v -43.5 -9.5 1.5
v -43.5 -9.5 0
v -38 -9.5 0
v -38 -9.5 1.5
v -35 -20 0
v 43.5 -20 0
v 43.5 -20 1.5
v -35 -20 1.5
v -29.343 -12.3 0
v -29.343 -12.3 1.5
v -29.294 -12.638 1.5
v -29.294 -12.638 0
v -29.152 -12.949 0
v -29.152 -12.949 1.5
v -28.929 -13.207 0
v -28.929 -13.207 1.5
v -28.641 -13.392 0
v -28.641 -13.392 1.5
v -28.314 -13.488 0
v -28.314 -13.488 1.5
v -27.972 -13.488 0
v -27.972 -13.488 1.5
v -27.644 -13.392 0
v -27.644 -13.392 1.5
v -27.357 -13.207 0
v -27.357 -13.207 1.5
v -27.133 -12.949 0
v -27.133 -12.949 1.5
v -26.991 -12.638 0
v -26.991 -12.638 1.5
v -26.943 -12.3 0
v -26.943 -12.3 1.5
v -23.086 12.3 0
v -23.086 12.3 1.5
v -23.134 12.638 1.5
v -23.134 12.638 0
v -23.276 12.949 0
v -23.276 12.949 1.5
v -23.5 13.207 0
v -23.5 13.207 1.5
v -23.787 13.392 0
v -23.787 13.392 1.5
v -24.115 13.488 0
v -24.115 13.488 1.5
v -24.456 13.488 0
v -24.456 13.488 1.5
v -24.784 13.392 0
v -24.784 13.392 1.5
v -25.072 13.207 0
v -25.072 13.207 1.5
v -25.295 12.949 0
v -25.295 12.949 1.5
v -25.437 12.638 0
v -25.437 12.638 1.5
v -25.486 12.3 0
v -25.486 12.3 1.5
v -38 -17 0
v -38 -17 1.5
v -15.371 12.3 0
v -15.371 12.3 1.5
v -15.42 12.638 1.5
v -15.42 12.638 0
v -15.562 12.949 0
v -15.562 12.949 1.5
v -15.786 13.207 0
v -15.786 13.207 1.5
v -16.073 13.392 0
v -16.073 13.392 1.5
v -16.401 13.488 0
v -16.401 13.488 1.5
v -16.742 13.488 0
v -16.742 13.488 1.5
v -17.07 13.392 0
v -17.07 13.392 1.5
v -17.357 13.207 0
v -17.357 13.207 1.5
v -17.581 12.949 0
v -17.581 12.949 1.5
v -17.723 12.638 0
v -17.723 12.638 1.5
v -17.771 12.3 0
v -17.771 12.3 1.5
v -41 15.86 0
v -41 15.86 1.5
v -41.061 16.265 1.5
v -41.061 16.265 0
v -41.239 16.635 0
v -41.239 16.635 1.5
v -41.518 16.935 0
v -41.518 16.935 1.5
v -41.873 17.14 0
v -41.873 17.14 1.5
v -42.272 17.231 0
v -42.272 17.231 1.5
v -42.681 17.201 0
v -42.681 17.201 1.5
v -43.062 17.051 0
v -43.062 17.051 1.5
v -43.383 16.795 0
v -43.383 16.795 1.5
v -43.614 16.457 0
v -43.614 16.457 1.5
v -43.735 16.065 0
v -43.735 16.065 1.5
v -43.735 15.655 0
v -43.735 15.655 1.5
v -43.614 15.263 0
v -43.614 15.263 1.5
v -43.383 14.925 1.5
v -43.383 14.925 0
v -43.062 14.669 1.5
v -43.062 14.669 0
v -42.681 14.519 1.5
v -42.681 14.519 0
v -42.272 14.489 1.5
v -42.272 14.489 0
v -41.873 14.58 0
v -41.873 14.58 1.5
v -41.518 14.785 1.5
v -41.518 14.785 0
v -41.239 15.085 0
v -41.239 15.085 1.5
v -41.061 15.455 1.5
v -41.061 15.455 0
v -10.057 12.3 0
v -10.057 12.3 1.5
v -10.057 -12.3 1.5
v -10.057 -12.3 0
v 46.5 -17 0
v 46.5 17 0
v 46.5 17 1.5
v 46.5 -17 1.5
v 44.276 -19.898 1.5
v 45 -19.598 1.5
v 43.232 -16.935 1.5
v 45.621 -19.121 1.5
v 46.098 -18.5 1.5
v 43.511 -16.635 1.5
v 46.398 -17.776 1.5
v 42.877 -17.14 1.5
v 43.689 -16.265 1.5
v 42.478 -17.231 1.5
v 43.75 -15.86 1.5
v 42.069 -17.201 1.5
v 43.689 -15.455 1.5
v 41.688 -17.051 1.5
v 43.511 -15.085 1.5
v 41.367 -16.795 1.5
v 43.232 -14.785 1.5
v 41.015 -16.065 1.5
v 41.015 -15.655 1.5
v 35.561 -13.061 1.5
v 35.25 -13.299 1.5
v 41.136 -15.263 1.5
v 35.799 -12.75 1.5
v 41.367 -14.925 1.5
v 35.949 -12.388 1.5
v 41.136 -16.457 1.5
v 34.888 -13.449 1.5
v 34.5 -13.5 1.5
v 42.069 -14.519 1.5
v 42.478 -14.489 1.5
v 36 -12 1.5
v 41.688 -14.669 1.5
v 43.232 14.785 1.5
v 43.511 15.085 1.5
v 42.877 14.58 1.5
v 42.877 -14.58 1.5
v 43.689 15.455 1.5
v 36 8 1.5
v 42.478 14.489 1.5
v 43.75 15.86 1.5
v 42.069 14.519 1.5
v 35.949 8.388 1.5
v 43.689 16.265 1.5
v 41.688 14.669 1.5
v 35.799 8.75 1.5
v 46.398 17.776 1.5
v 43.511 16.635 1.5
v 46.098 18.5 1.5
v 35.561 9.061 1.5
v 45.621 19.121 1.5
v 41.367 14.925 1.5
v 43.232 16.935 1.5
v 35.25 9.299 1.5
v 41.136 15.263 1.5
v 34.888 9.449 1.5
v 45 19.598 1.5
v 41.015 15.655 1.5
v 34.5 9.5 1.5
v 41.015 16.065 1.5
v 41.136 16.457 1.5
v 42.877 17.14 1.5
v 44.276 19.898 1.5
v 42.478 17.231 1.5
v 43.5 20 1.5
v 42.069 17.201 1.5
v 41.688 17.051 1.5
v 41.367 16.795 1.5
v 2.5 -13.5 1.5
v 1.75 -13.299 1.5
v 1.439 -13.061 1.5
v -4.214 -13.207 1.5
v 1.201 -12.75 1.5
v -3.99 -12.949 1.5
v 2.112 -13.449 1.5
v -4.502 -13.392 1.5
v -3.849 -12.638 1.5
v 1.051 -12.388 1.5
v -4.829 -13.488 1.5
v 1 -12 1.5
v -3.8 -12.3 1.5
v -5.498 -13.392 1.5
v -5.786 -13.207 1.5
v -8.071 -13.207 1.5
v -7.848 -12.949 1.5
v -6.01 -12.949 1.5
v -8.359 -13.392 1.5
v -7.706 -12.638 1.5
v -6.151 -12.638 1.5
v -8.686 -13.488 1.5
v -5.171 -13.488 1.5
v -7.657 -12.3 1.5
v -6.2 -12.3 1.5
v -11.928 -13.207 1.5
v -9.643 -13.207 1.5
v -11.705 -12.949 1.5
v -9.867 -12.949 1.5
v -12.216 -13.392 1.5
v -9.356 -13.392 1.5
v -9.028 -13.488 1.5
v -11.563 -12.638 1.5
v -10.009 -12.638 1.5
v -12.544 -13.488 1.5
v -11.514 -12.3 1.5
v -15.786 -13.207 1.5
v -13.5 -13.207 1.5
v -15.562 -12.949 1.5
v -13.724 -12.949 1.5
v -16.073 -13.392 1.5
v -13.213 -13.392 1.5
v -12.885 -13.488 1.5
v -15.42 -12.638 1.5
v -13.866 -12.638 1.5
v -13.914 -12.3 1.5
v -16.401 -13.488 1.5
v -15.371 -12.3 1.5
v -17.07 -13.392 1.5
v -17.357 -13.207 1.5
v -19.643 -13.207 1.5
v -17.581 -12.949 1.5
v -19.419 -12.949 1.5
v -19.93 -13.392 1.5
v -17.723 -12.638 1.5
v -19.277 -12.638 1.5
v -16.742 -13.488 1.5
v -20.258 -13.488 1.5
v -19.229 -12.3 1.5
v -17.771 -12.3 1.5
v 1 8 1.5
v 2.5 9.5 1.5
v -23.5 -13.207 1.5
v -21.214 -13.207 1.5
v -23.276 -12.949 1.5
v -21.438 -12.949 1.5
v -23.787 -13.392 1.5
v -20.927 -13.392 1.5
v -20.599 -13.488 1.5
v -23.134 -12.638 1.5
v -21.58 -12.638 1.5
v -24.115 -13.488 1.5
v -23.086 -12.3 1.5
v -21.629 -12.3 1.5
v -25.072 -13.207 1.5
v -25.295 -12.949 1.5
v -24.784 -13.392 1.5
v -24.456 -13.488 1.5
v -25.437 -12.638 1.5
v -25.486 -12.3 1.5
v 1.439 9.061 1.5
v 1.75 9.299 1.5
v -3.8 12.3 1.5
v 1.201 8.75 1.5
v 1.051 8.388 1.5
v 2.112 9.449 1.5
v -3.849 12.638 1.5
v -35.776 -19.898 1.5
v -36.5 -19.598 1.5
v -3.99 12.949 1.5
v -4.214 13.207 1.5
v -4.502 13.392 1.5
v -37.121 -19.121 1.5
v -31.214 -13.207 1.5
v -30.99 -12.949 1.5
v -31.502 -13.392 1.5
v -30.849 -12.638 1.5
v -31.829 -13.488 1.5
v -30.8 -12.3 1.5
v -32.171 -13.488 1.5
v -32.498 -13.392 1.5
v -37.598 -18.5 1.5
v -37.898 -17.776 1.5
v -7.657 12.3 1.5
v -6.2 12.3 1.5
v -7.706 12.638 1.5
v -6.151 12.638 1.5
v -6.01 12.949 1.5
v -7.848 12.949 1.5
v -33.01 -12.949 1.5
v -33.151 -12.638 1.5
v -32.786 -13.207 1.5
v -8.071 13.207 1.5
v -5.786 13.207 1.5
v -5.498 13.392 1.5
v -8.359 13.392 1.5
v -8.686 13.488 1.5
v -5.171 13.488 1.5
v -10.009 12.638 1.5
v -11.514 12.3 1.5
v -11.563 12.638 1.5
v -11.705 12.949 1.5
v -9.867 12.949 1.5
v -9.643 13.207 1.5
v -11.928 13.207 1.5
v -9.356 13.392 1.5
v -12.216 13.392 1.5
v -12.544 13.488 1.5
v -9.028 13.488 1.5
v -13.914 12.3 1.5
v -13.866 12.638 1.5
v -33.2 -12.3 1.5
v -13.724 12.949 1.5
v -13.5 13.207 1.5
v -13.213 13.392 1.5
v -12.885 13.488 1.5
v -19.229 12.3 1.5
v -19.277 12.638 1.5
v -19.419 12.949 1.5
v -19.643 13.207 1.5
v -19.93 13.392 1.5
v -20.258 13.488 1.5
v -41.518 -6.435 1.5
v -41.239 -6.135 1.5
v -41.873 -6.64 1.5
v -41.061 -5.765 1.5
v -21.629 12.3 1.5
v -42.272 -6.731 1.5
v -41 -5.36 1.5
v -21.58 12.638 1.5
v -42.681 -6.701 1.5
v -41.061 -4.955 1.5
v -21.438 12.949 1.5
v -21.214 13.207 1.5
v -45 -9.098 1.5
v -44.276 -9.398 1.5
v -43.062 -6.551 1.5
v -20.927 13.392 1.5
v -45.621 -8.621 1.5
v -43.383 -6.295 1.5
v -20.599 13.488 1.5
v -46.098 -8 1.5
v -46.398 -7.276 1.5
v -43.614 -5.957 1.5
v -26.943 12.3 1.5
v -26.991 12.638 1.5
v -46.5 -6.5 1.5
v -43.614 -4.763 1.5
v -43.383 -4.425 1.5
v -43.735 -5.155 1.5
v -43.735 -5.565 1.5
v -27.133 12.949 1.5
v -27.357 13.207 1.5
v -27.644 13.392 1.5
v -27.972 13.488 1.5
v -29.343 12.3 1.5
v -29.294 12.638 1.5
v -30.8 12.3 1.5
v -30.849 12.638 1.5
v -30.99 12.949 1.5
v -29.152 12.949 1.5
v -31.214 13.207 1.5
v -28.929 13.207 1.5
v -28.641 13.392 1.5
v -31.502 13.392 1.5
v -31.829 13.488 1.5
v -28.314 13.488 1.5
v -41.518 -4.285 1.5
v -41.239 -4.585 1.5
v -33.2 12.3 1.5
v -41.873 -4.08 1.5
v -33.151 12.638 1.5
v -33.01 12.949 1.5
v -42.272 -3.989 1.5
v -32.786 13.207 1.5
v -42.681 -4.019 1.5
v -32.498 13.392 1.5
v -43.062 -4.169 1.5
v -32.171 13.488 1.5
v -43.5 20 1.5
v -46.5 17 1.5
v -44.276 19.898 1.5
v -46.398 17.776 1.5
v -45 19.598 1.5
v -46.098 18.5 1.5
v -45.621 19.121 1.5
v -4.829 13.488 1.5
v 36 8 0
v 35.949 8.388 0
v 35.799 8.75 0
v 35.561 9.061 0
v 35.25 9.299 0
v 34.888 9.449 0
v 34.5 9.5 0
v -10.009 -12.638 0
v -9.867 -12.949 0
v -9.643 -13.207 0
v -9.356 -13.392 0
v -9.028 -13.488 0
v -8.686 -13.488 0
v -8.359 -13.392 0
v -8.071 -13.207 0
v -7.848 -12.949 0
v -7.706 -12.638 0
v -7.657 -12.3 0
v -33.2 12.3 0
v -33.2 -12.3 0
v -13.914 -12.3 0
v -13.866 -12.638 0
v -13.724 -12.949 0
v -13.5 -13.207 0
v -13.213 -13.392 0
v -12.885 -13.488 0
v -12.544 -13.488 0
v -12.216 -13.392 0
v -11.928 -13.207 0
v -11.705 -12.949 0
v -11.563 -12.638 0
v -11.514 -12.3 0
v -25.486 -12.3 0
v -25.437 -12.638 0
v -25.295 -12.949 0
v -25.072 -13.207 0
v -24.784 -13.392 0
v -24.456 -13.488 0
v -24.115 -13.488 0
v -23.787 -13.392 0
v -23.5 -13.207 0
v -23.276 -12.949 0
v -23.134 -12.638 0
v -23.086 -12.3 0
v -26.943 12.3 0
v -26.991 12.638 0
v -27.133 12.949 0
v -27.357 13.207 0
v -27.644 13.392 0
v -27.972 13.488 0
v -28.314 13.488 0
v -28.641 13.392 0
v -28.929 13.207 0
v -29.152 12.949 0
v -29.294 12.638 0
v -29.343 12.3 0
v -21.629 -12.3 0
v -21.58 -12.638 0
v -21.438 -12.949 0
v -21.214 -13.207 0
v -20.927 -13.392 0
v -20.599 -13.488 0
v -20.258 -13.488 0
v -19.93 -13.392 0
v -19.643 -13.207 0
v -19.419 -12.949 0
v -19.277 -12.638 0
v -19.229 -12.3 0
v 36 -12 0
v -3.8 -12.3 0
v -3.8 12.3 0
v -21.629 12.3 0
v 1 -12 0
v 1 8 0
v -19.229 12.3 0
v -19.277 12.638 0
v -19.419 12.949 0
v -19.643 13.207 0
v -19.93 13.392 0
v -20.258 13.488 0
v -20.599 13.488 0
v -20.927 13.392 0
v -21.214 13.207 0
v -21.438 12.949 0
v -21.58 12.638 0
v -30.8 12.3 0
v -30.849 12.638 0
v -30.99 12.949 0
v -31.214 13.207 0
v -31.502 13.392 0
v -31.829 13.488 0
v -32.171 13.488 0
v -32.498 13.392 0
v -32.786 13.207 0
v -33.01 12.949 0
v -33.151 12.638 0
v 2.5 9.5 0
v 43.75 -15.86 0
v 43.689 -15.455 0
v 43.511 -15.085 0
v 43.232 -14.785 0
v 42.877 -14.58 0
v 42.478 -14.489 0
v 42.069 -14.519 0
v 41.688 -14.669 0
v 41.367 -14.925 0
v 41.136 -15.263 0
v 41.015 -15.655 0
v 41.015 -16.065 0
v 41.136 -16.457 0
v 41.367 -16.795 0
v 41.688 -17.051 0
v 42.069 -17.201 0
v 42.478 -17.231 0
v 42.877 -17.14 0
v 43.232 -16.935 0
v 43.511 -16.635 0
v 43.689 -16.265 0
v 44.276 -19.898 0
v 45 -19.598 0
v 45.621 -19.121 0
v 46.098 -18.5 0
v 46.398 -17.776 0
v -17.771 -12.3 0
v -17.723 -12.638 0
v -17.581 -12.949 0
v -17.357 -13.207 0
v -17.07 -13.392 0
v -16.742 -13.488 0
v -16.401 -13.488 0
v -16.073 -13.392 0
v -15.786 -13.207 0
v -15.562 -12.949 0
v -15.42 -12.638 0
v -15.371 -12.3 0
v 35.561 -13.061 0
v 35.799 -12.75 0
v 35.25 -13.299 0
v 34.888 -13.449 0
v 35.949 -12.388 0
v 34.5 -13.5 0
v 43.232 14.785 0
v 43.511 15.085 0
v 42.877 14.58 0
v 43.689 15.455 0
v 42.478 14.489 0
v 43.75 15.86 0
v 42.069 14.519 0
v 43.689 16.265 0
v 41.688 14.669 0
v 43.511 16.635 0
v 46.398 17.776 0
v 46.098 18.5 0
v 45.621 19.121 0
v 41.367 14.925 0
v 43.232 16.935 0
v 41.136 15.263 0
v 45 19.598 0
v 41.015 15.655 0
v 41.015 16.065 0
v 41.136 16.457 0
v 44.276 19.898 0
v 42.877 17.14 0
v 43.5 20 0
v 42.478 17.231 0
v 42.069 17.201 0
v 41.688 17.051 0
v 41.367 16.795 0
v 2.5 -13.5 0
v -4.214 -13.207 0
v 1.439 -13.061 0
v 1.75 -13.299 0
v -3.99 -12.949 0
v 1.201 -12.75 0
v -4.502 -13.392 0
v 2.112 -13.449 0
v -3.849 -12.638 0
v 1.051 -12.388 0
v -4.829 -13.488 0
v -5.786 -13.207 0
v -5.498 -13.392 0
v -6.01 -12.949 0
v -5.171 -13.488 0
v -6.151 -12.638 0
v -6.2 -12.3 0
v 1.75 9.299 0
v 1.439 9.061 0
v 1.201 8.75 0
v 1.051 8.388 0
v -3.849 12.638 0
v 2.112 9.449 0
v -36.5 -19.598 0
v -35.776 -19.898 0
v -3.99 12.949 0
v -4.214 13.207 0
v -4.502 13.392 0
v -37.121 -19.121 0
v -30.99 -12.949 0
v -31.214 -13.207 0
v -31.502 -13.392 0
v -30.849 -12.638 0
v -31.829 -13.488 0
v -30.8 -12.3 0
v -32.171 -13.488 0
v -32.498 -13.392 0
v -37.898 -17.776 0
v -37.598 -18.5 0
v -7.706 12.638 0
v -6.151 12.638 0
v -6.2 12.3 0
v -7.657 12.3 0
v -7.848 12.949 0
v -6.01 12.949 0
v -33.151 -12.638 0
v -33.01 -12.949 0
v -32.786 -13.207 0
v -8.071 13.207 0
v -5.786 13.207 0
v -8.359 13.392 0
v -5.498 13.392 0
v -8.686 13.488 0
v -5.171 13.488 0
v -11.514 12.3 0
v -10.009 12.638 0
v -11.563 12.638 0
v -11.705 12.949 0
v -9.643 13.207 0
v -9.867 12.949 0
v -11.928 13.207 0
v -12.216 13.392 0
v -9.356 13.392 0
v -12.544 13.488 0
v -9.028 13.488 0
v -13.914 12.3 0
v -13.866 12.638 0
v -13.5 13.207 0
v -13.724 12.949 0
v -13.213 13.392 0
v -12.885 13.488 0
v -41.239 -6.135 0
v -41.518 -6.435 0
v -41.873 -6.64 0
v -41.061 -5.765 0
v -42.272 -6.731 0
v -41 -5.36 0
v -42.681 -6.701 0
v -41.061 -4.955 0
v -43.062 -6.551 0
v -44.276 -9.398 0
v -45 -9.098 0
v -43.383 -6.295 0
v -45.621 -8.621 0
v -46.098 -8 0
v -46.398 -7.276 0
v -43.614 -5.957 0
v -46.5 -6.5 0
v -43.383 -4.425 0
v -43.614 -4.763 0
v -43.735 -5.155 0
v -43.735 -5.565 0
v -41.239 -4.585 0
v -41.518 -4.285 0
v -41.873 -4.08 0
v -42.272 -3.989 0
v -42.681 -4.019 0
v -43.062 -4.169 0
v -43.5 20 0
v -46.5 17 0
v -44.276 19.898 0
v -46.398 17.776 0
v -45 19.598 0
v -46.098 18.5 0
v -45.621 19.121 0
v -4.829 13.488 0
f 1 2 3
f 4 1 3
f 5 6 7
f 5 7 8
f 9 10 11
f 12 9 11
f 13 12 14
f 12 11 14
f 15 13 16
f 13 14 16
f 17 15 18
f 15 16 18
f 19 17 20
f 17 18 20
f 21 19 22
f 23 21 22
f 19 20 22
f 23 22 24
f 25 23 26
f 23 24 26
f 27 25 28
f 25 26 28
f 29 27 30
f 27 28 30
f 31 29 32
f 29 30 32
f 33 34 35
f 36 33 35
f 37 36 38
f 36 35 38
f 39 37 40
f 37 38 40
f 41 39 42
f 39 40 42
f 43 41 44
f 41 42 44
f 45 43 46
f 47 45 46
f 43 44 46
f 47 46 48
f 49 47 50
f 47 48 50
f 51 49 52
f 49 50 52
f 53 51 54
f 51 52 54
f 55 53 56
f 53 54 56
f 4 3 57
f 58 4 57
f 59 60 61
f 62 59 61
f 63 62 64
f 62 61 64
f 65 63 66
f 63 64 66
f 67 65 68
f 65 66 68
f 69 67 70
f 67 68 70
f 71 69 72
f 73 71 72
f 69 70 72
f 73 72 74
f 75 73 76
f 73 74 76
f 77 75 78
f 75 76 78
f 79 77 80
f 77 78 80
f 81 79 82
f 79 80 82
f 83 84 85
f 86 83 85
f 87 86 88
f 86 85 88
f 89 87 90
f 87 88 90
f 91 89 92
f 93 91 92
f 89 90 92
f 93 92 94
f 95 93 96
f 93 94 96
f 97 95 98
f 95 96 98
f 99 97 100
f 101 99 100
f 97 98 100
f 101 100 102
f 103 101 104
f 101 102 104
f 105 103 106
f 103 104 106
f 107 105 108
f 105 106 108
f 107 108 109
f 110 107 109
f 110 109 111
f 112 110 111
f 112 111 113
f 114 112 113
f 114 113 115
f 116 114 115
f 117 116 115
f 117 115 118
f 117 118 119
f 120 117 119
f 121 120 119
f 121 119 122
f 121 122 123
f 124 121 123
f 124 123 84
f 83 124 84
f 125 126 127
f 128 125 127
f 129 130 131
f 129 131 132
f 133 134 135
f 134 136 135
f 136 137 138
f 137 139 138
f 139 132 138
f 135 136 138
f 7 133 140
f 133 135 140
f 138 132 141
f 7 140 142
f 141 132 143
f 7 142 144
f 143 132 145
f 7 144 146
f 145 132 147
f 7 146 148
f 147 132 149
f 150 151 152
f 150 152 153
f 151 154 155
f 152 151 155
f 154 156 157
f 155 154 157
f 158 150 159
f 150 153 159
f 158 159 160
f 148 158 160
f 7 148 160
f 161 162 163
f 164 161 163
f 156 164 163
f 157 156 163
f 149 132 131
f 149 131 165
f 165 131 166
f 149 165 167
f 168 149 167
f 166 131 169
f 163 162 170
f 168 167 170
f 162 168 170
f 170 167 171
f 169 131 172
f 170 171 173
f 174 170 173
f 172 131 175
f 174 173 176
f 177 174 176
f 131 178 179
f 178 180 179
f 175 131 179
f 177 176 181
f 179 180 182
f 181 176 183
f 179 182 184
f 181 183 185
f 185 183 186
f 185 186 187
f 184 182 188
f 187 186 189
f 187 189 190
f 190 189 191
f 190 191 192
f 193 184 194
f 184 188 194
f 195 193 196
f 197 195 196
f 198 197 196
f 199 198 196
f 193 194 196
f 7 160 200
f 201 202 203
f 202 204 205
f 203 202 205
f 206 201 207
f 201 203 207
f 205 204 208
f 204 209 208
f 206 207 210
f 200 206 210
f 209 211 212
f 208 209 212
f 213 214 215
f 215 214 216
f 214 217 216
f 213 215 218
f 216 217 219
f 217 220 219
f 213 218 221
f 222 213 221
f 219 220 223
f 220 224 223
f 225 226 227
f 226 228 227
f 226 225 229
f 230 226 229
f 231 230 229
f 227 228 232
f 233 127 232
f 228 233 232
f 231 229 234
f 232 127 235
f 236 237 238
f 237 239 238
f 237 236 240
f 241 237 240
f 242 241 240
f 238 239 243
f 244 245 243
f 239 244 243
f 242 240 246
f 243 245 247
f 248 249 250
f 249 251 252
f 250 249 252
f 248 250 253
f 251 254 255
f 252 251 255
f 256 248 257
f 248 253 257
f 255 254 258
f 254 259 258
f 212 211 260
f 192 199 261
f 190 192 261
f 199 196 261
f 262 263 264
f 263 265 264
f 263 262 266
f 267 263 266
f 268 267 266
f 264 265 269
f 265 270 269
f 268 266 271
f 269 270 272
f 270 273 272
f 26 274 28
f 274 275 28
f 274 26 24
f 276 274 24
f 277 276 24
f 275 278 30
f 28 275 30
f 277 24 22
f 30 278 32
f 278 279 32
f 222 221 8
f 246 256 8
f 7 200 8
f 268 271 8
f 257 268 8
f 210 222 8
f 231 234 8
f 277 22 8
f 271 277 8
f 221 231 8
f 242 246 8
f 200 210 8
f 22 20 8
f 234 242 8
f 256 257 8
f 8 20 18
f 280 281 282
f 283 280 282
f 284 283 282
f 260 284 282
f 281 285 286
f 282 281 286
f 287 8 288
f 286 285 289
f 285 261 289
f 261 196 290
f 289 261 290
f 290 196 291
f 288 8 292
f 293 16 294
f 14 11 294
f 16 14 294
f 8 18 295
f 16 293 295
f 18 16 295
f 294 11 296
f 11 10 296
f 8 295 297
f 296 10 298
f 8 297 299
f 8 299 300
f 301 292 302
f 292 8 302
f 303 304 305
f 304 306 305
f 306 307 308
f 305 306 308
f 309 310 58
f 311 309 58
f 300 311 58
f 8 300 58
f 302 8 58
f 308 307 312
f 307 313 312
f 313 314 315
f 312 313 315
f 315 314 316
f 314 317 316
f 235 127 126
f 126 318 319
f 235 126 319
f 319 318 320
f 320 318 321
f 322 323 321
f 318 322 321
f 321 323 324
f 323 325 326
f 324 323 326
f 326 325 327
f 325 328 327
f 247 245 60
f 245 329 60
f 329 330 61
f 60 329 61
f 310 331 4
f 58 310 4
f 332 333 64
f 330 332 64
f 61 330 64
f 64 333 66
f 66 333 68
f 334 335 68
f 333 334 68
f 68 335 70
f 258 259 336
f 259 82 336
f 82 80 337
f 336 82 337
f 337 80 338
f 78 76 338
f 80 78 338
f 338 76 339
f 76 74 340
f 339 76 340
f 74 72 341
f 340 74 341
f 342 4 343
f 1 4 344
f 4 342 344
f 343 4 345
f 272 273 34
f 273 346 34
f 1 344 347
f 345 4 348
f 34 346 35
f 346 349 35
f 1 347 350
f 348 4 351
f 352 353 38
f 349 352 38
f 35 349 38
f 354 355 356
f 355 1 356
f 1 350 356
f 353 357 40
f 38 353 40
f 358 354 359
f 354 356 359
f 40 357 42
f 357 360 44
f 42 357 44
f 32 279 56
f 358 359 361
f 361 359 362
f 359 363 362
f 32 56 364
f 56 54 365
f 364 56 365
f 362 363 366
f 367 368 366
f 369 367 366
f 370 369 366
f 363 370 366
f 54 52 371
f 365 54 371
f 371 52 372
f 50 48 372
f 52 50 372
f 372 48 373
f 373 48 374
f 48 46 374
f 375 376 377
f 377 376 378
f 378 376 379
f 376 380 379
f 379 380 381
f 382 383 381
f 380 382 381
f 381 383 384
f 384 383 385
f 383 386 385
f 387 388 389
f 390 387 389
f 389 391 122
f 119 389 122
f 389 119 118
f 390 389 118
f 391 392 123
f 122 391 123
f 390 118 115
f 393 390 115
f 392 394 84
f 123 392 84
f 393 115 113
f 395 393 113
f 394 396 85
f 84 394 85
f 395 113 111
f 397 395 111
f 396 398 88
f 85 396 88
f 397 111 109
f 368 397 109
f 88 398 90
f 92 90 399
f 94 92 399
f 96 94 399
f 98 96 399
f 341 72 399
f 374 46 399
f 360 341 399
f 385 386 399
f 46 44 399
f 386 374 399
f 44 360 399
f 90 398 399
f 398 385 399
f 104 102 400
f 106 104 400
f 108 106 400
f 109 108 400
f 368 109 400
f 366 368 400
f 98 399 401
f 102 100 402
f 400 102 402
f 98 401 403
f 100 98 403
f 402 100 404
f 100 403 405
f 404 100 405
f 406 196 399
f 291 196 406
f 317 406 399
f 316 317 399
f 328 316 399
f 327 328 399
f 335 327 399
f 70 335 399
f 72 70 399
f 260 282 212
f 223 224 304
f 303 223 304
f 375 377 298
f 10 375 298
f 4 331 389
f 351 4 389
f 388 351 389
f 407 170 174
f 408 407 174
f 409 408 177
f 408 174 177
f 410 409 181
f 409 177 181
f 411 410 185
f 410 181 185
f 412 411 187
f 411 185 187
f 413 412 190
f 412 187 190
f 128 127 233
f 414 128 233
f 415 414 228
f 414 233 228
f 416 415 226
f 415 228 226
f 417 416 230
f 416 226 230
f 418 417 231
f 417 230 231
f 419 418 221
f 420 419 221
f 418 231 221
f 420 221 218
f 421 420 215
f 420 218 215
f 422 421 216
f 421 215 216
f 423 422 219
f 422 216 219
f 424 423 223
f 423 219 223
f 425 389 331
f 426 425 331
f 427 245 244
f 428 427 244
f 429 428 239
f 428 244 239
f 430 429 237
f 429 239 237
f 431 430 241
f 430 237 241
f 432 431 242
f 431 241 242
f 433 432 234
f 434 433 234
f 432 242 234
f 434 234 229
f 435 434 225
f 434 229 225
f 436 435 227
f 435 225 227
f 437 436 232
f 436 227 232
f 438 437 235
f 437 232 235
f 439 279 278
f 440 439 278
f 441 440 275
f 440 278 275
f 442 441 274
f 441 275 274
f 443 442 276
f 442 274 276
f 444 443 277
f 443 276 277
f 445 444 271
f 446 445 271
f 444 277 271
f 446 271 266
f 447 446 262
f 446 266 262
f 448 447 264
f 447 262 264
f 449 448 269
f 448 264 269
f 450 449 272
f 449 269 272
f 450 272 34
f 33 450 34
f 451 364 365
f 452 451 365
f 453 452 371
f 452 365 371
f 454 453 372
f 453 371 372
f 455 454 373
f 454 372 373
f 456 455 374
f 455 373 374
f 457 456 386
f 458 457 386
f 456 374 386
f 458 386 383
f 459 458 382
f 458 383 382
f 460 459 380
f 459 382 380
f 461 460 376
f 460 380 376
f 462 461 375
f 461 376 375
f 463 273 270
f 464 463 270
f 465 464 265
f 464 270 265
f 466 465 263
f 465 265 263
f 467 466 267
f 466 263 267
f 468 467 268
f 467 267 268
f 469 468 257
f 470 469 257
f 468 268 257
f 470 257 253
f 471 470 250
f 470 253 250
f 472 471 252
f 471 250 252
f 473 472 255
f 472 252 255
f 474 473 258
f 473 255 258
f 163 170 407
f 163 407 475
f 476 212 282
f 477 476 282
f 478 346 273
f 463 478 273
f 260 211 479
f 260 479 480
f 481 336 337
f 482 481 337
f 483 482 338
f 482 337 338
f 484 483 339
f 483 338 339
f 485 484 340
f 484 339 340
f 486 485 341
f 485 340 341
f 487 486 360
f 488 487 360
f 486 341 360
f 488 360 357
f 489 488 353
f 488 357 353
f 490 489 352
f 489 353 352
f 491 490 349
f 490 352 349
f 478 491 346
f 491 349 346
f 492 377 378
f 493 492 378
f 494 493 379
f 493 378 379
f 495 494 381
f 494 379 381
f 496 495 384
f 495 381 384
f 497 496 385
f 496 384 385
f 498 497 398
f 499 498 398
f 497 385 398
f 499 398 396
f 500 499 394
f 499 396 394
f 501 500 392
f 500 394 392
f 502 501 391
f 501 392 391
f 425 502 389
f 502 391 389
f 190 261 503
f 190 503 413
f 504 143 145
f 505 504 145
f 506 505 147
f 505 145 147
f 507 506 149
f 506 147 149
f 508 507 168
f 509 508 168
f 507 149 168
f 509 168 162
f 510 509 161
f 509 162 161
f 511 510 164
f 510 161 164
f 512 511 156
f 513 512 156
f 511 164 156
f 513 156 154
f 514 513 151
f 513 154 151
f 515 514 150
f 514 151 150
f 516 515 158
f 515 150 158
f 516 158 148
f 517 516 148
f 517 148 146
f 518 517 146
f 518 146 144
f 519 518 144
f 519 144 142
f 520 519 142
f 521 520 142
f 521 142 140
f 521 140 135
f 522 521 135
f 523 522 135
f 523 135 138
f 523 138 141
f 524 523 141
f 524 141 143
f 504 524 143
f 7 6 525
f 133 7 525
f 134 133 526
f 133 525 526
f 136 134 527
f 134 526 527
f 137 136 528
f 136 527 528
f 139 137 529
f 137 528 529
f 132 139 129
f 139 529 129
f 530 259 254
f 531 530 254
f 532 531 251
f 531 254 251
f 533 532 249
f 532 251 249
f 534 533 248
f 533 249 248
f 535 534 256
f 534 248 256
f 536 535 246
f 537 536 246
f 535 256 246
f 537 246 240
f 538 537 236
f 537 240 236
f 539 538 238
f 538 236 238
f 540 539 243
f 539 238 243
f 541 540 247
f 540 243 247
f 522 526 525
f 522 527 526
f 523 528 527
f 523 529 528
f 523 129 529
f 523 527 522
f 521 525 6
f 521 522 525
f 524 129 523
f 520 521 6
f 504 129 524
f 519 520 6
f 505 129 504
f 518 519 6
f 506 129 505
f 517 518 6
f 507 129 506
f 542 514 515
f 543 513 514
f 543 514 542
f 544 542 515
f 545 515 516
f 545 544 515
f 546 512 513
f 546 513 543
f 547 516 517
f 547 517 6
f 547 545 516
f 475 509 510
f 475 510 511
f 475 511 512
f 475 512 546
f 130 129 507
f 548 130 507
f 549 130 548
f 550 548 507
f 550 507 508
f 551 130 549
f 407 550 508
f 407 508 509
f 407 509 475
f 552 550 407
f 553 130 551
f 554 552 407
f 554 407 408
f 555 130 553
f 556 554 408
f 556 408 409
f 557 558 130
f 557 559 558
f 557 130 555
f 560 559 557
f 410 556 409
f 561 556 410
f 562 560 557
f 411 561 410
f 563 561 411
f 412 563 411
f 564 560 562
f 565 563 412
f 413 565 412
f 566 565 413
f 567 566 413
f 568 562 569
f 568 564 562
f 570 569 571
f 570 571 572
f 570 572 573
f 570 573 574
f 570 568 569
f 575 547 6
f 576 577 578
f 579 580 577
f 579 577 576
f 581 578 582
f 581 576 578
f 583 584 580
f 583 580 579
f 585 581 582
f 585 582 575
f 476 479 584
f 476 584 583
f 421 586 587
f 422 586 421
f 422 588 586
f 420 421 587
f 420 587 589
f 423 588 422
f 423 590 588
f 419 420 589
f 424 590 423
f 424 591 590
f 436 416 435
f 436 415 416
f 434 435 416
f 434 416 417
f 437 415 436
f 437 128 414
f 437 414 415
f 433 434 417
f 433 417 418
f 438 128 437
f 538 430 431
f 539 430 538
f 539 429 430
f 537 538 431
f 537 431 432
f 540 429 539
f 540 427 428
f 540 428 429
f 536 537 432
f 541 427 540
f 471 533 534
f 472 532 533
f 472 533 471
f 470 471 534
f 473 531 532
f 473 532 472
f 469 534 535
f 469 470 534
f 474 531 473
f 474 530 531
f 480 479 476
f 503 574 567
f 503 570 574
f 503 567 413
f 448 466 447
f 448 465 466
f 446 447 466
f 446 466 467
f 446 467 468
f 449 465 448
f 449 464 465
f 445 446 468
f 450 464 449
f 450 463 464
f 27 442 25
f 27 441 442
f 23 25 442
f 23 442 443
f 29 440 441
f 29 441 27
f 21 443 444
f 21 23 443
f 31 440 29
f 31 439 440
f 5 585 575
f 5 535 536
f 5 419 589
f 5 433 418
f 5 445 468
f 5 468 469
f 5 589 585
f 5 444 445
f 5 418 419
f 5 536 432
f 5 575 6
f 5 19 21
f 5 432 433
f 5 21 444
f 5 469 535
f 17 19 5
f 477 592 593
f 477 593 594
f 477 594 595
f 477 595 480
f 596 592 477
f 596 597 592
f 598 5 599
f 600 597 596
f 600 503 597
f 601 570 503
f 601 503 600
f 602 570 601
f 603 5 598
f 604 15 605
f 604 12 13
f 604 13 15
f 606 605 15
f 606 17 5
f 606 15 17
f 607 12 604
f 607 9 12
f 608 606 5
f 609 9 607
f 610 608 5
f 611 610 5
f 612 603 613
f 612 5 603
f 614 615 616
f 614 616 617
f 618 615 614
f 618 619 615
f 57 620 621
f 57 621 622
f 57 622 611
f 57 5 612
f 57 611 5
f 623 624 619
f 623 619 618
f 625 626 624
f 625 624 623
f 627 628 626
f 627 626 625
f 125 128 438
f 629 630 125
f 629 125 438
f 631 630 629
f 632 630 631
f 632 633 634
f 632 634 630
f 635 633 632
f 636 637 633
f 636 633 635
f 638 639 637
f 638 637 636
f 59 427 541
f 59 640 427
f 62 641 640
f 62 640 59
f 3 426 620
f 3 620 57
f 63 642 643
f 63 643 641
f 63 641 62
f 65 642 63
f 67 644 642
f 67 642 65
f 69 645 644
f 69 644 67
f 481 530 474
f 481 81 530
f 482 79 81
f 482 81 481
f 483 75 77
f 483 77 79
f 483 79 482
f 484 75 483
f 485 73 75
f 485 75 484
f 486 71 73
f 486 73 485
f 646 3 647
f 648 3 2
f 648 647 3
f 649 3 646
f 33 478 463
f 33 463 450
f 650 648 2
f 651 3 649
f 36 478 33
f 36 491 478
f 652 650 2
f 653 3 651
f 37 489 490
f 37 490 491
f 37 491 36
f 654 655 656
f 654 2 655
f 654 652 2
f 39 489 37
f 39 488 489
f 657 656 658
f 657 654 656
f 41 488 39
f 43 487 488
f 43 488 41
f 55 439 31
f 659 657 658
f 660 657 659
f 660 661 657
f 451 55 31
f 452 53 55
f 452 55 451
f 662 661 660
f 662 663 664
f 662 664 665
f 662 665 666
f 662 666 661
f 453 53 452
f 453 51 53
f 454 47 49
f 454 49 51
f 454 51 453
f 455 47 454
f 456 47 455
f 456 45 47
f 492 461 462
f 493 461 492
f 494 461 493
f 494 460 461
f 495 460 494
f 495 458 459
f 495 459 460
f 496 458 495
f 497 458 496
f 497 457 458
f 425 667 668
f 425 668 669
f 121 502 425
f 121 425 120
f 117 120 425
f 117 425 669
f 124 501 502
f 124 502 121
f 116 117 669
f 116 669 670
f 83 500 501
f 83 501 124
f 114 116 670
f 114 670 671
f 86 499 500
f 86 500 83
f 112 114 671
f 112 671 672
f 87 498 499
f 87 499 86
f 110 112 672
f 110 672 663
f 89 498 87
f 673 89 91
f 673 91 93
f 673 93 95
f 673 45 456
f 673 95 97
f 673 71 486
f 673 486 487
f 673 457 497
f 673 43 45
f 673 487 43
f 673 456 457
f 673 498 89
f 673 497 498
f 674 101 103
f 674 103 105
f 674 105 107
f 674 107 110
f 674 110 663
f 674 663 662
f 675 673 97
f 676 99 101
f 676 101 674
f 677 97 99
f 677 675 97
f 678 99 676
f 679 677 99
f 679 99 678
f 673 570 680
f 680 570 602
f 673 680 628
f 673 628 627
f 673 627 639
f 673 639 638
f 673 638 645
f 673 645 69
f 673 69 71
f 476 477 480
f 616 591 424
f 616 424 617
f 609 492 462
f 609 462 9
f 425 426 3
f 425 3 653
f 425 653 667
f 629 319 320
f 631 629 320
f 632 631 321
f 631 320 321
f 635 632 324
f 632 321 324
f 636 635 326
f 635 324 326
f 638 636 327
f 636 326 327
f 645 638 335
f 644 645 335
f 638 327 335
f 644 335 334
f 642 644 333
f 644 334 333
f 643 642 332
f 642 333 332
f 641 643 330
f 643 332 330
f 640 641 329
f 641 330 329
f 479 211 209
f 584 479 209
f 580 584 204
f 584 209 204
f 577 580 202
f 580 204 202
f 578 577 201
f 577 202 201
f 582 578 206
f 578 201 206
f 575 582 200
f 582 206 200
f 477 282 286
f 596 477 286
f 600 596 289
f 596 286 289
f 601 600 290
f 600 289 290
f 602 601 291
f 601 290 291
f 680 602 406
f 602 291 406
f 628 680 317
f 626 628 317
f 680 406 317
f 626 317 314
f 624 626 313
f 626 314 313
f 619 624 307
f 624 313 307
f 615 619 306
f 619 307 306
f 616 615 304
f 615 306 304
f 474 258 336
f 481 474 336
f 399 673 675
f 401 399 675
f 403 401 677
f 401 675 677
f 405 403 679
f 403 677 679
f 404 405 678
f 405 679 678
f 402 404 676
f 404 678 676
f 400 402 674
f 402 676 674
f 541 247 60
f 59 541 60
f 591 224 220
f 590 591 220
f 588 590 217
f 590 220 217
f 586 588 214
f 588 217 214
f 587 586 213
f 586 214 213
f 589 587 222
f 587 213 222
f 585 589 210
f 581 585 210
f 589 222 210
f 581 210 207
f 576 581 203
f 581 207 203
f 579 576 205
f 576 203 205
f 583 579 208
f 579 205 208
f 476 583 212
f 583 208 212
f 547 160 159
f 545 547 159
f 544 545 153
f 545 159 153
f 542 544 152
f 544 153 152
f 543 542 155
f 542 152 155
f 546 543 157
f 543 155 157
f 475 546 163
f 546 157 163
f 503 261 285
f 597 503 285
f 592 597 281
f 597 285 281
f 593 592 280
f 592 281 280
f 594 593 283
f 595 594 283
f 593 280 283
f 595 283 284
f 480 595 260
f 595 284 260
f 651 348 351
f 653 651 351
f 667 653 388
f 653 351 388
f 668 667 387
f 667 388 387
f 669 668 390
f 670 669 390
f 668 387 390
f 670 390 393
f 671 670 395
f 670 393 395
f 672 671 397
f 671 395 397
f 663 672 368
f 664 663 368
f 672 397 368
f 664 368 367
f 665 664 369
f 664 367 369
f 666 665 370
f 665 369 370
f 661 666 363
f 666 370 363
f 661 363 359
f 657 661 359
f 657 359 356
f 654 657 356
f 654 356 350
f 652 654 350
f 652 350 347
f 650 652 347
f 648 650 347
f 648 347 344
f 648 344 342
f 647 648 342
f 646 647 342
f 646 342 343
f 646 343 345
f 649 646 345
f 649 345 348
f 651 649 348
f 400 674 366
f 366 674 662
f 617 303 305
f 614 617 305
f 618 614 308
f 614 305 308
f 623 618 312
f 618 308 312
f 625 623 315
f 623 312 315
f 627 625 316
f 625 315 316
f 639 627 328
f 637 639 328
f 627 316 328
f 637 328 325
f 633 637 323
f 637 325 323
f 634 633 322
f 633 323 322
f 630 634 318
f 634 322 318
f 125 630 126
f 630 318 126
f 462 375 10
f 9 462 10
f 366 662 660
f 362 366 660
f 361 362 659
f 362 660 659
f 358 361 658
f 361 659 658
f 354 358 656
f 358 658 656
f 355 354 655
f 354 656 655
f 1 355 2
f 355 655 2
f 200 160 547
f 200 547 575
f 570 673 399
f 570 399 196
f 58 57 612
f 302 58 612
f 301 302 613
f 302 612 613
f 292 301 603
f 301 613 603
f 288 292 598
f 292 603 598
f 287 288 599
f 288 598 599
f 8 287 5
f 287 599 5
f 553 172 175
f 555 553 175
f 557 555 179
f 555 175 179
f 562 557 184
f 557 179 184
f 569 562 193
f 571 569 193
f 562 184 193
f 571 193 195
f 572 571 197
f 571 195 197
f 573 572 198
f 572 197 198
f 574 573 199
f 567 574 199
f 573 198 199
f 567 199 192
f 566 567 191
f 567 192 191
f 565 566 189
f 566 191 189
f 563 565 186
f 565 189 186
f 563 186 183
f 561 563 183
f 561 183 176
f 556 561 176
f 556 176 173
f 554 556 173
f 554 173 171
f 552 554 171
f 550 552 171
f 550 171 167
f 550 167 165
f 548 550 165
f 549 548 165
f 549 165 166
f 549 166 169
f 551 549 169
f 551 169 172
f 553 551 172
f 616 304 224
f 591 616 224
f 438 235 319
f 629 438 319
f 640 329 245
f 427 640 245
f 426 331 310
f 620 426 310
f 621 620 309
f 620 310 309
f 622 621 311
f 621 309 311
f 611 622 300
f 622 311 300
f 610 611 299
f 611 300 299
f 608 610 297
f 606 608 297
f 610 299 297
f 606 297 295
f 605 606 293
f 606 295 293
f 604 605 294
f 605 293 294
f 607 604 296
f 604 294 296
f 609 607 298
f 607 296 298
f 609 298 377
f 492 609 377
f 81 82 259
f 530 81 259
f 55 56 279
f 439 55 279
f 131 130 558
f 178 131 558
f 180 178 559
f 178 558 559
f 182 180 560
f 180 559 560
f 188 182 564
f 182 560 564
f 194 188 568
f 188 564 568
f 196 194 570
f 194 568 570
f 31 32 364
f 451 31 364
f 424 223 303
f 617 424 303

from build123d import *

# Parameters (mm, degrees)
PAD_DEPTH           = 1.5
POCKET_DEPTH        = 5
POCKET001_DEPTH     = 5
LINEARPATTERN_COUNT = 8
LINEARPATTERN_PITCH = 3.857143
SKETCH003_R         = 1.375
POCKET002_DEPTH     = 5


with BuildPart() as part:
    # Sketch → Pad (new body)
    with BuildSketch(Plane.XY):
        with BuildLine():
            Line((-43.5, 20), (43.5, 20))
            ThreePointArc((46.5, 17), (45.62132, 19.12132), (43.5, 20))
            Line((46.5, 17), (46.5, -17))
            ThreePointArc((43.5, -20), (45.62132, -19.12132), (46.5, -17))
            Line((43.5, -20), (-35, -20))
            ThreePointArc((-38, -17), (-37.12132, -19.12132), (-35, -20))
            Line((-38, -9.5), (-38, -17))
            Line((-43.5, -9.5), (-38, -9.5))
            ThreePointArc((-46.5, -6.5), (-45.62132, -8.62132), (-43.5, -9.5))
            Line((-46.5, 17), (-46.5, -6.5))
            ThreePointArc((-43.5, 20), (-45.62132, 19.12132), (-46.5, 17))
        make_face()
    extrude(amount=PAD_DEPTH)

    # Sketch001 (on Face13 of Pad) → Pocket (cut)
    with BuildSketch(Plane.XY.offset(1.5)):
        with BuildLine():
            Line((2.5, 9.5), (34.5, 9.5))
            ThreePointArc((36, 8), (35.56066, 9.06066), (34.5, 9.5))
            Line((36, 8), (36, -12))
            ThreePointArc((34.5, -13.5), (35.56066, -13.06066), (36, -12))
            Line((34.5, -13.5), (2.5, -13.5))
            ThreePointArc((1, -12), (1.43934, -13.06066), (2.5, -13.5))
            Line((1, -12), (1, 8))
            ThreePointArc((2.5, 9.5), (1.43934, 9.06066), (1, 8))
        make_face()
    extrude(amount=-POCKET_DEPTH, mode=Mode.SUBTRACT)

    # Sketch002 (on Face5 of Pocket) → Pocket001 (cut)
    with BuildSketch(Plane.XY.offset(1.5)):
        with BuildLine():
            ThreePointArc((-30.8, 12.3), (-32, 13.5), (-33.2, 12.3))
            Line((-33.2, 12.3), (-33.2, -12.3))
            ThreePointArc((-33.2, -12.3), (-32, -13.5), (-30.8, -12.3))
            Line((-30.8, -12.3), (-30.8, 12.3))
        make_face()
    pocket001 = extrude(amount=-POCKET001_DEPTH, mode=Mode.SUBTRACT)

    # LinearPattern: Pocket001 ×8
    with Locations(*[(i * LINEARPATTERN_PITCH, 0, 0) for i in range(1, LINEARPATTERN_COUNT)]):
        add(pocket001, mode=Mode.SUBTRACT)

    # Sketch003 (on Face5 of LinearPattern) → Pocket002 (cut)
    with BuildSketch(Plane.XY.offset(1.5)):
        with Locations((42.375, 15.86)):
            Circle(SKETCH003_R)
        with Locations((-42.375, 15.86)):
            Circle(SKETCH003_R)
        with Locations((42.375, -15.86)):
            Circle(SKETCH003_R)
        with Locations((-42.375, -5.36)):
            Circle(SKETCH003_R)
    extrude(amount=-POCKET002_DEPTH, mode=Mode.SUBTRACT)


solid = part.part
